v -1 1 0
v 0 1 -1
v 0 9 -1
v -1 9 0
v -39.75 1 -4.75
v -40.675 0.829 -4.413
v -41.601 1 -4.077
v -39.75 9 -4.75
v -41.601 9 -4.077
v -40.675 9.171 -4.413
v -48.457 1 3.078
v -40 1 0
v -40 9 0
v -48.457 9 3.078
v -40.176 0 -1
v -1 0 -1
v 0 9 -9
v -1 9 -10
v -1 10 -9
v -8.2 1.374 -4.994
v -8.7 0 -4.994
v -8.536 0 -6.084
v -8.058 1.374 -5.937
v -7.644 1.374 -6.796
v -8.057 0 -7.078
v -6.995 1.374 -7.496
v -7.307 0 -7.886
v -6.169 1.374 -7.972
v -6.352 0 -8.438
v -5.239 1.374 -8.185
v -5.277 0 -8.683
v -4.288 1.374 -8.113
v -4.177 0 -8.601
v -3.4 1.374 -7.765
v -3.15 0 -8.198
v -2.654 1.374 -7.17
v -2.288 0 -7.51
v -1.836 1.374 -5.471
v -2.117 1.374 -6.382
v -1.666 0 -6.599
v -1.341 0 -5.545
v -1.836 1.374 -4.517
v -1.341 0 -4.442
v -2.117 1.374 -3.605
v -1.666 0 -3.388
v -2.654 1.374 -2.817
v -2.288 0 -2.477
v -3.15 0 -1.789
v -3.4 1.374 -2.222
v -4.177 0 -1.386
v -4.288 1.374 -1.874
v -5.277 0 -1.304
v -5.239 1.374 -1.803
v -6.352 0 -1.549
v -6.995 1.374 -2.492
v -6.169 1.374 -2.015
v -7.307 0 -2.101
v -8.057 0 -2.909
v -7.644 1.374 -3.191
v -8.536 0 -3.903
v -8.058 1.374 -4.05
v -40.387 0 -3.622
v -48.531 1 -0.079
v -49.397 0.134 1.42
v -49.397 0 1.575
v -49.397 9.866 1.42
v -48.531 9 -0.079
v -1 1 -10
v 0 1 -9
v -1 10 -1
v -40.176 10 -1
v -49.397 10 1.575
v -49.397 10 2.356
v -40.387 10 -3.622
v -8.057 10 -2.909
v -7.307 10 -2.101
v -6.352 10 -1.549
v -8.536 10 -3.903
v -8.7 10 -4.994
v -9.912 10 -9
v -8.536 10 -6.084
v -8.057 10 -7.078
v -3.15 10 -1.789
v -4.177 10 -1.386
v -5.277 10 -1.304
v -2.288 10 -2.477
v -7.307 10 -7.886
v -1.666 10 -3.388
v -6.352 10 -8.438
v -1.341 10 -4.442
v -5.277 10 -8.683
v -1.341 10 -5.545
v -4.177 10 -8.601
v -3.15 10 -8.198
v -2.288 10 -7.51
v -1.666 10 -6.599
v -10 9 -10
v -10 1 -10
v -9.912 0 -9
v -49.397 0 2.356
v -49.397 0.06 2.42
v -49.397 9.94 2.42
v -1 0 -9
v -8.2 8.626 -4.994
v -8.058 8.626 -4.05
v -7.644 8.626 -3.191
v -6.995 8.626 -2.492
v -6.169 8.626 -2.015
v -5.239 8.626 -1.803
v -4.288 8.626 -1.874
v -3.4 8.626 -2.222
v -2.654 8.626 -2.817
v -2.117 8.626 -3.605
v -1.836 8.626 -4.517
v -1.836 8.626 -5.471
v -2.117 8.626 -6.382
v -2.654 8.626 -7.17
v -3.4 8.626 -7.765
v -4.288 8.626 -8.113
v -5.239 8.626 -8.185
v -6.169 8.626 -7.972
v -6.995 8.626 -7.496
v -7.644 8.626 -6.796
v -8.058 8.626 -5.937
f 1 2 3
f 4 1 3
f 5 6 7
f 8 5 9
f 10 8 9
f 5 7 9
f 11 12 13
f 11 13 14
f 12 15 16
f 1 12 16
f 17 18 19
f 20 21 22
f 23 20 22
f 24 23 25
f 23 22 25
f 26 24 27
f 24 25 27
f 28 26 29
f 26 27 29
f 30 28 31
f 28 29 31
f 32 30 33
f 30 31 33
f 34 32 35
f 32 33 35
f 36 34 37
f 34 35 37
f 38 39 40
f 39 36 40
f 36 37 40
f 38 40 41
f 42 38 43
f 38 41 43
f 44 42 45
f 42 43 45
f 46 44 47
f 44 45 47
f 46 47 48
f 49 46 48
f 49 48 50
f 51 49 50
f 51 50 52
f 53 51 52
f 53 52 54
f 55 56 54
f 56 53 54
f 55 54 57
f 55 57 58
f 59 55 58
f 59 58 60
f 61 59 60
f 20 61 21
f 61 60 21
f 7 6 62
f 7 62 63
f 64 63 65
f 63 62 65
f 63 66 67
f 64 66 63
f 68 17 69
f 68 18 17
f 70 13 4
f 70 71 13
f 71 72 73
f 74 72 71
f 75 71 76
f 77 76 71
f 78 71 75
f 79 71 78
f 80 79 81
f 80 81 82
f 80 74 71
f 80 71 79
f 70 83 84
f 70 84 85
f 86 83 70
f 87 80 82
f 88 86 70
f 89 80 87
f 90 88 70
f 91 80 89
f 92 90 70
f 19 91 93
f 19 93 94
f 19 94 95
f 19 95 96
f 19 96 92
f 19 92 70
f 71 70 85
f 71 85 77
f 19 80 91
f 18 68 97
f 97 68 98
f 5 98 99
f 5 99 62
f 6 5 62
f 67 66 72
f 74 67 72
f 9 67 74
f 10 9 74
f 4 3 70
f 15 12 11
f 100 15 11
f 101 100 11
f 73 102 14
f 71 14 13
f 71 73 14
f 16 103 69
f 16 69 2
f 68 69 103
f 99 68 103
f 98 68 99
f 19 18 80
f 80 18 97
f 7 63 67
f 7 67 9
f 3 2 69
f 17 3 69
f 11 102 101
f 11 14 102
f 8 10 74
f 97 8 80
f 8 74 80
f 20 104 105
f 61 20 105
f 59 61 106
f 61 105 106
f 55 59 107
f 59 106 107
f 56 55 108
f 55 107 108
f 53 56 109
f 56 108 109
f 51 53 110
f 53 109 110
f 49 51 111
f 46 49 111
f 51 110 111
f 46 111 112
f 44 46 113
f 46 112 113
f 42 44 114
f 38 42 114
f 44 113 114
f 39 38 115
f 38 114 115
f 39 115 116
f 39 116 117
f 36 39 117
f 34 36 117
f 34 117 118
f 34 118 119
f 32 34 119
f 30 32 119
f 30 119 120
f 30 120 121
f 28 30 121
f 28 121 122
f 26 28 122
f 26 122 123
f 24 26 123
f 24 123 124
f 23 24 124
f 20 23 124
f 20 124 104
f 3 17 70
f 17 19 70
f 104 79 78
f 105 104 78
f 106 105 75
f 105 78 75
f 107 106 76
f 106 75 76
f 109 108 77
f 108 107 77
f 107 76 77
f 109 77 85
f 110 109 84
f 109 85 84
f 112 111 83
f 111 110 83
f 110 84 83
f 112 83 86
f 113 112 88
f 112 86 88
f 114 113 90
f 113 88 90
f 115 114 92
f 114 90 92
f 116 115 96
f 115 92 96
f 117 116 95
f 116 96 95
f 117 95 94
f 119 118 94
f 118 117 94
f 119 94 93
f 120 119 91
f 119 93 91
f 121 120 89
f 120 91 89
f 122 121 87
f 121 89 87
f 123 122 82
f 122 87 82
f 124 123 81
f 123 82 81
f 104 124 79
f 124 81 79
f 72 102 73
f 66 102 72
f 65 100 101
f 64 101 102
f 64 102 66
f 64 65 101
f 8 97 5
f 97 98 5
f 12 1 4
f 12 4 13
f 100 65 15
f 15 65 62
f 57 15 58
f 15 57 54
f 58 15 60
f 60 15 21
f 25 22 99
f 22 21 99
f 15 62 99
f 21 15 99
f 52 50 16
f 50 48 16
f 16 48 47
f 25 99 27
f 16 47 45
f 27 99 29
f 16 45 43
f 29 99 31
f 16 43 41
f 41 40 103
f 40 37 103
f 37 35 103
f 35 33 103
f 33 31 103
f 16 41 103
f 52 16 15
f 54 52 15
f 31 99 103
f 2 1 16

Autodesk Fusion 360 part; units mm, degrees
sketch "Sketch3" plane through (0, 0, 0) normal (0, 1, 0) x (1, 0, 0)
  line L0 (0, 0) -> (-40, 0)
  line L1 (-40, 0) -> (-49.3969, -3.4202)
  line L2 (-40, 0) -> (-30, 0) construction
  line L3 (-49.3969, -3.4202) -> (-49.3969, -0.4202)
  line L4 (-49.3969, -0.4202) -> (-40.7346, 4.5763)
  line L5 (0, 0) -> (0, 10)
  line L6 (0, 10) -> (-10, 10)
  line L7 (-10, 10) -> (-40.7346, 4.5763)
  dimension "d3" = 40
  dimension "d4" = 160
  dimension "d5" = 10
  dimension "d6" = 3
  dimension "d7" = 10
  dimension "d8" = 10
  dimension "d9" = 10
extrude "Extrude1" add sketch "Sketch3" along normal blind 10
sketch "Sketch4" plane through (0, 10, 0) normal (0, 1, 0) x (-1, 0, 0)
  line L0 (0, 0) -> (0, -10)
  line L1 (0, -10) -> (10, -10)
  line L2 (10, -10) -> (40.7346, -4.5763)
  line L3 (40.7346, -4.5763) -> (49.3969, 0.4202)
  line L4 (49.3969, 0.4202) -> (49.3969, 3.4202)
  line L5 (49.3969, 3.4202) -> (40, 0)
  line L6 (40, 0) -> (0, 0)
  line L7 (0, 0) -> (10, 0)
  line L8 (0, -5) -> (5, -4.9937)
  circle A0 centre (5, -4.9937) radius 3.2
  dimension "d12" = 10
  dimension "d26" = 5
  dimension "d27" = 6.4
sketch "Sketch5" plane through (0, 0, 0) normal (0, -1, 0) x (1, 0, 0)
  line L0 (0, -10) -> (0, 0)
  line L1 (0, 0) -> (-40, 0)
  line L2 (-40, 0) -> (-49.3969, 3.4202)
  line L3 (-49.3969, 3.4202) -> (-49.3969, 0.4202)
  line L4 (-49.3969, 0.4202) -> (-40.7346, -4.5763)
  line L5 (-40.7346, -4.5763) -> (-10, -10)
  line L6 (-10, -10) -> (0, -10)
  line L7 (0, 0) -> (-10, 0)
  dimension "d13" = 10
extrude "Extrude2" cut sketch "Sketch4" against normal blind 21 contours A0
chamfer "Chamfer1" distance 1 angle 45 8 edges at (0, 5, -10) (0, 5, 0) (-5, 10, -10) (0, 10, -5) (-20, 10, 0) (-20, 0, 0) (0, 0, -5) (-5, 0, -10)
chamfer "Chamfer2" distance 1 angle 45 1 edges at (-43.3247, 10, 1.2101)
chamfer "Chamfer3" distance 1 angle 45 1 edges at (-45.0658, 10, -2.078)
chamfer "Chamfer4" distance 1 angle 45 1 edges at (-28.2007, 0, -6.7881)
chamfer "Chamfer5" distance 1 angle 45 1 edges at (-26.7588, 10, -7.0426)
chamfer "Chamfer6" distance 1 angle 45 1 edges at (-40.7346, 5, -4.5763)
chamfer "Chamfer7" distance 1 angle 45 1 edges at (-49.3969, 4.5, 0.4202)
chamfer "Chamfer8" distance 1 angle 45 1 edges at (-45.9009, 0, -1.5963)
chamfer "Chamfer9" distance 1 angle 45 1 edges at (-43.3247, 0, 1.2101)
chamfer "Chamfer10" distance 1 angle 45 1 edges at (-49.3969, 5, 3.4202)
chamfer "Chamfer11" distance 0.5 angle 70 2 edges at (-2.0165, 0, -6.1508) (-2.0165, 10, -3.8365) measured on face at (-19.4177, 0, -4.8389) measured on face at (-19.4177, 10, -4.8389)
equation "d14 = ElephantFIT"
equation "ElephantFIT = 1 mm" comment "Chamfer by this amount"
equation "d16 = StyleFIT"
equation "d17 = StyleFIT"
equation "d18 = StyleFIT"
equation "d19 = StyleFIT"
equation "d20 = StyleFIT"
equation "d21 = StyleFIT"
equation "d22 = StyleFIT"
equation "d23 = StyleFIT"
equation "d24 = StyleFIT"
equation "StyleFIT = 1 mm"
equation "d26 = HolePosX"
equation "d27 = HoleSize"
equation "HoleSize = 6.4 mm"
equation "HolePosX = 5 mm"
equation "d32 = HoleFIT"
equation "d33 = HoleAngle"
equation "HoleFIT = 0.5 mm"
equation "HoleAngle = 70 deg"
